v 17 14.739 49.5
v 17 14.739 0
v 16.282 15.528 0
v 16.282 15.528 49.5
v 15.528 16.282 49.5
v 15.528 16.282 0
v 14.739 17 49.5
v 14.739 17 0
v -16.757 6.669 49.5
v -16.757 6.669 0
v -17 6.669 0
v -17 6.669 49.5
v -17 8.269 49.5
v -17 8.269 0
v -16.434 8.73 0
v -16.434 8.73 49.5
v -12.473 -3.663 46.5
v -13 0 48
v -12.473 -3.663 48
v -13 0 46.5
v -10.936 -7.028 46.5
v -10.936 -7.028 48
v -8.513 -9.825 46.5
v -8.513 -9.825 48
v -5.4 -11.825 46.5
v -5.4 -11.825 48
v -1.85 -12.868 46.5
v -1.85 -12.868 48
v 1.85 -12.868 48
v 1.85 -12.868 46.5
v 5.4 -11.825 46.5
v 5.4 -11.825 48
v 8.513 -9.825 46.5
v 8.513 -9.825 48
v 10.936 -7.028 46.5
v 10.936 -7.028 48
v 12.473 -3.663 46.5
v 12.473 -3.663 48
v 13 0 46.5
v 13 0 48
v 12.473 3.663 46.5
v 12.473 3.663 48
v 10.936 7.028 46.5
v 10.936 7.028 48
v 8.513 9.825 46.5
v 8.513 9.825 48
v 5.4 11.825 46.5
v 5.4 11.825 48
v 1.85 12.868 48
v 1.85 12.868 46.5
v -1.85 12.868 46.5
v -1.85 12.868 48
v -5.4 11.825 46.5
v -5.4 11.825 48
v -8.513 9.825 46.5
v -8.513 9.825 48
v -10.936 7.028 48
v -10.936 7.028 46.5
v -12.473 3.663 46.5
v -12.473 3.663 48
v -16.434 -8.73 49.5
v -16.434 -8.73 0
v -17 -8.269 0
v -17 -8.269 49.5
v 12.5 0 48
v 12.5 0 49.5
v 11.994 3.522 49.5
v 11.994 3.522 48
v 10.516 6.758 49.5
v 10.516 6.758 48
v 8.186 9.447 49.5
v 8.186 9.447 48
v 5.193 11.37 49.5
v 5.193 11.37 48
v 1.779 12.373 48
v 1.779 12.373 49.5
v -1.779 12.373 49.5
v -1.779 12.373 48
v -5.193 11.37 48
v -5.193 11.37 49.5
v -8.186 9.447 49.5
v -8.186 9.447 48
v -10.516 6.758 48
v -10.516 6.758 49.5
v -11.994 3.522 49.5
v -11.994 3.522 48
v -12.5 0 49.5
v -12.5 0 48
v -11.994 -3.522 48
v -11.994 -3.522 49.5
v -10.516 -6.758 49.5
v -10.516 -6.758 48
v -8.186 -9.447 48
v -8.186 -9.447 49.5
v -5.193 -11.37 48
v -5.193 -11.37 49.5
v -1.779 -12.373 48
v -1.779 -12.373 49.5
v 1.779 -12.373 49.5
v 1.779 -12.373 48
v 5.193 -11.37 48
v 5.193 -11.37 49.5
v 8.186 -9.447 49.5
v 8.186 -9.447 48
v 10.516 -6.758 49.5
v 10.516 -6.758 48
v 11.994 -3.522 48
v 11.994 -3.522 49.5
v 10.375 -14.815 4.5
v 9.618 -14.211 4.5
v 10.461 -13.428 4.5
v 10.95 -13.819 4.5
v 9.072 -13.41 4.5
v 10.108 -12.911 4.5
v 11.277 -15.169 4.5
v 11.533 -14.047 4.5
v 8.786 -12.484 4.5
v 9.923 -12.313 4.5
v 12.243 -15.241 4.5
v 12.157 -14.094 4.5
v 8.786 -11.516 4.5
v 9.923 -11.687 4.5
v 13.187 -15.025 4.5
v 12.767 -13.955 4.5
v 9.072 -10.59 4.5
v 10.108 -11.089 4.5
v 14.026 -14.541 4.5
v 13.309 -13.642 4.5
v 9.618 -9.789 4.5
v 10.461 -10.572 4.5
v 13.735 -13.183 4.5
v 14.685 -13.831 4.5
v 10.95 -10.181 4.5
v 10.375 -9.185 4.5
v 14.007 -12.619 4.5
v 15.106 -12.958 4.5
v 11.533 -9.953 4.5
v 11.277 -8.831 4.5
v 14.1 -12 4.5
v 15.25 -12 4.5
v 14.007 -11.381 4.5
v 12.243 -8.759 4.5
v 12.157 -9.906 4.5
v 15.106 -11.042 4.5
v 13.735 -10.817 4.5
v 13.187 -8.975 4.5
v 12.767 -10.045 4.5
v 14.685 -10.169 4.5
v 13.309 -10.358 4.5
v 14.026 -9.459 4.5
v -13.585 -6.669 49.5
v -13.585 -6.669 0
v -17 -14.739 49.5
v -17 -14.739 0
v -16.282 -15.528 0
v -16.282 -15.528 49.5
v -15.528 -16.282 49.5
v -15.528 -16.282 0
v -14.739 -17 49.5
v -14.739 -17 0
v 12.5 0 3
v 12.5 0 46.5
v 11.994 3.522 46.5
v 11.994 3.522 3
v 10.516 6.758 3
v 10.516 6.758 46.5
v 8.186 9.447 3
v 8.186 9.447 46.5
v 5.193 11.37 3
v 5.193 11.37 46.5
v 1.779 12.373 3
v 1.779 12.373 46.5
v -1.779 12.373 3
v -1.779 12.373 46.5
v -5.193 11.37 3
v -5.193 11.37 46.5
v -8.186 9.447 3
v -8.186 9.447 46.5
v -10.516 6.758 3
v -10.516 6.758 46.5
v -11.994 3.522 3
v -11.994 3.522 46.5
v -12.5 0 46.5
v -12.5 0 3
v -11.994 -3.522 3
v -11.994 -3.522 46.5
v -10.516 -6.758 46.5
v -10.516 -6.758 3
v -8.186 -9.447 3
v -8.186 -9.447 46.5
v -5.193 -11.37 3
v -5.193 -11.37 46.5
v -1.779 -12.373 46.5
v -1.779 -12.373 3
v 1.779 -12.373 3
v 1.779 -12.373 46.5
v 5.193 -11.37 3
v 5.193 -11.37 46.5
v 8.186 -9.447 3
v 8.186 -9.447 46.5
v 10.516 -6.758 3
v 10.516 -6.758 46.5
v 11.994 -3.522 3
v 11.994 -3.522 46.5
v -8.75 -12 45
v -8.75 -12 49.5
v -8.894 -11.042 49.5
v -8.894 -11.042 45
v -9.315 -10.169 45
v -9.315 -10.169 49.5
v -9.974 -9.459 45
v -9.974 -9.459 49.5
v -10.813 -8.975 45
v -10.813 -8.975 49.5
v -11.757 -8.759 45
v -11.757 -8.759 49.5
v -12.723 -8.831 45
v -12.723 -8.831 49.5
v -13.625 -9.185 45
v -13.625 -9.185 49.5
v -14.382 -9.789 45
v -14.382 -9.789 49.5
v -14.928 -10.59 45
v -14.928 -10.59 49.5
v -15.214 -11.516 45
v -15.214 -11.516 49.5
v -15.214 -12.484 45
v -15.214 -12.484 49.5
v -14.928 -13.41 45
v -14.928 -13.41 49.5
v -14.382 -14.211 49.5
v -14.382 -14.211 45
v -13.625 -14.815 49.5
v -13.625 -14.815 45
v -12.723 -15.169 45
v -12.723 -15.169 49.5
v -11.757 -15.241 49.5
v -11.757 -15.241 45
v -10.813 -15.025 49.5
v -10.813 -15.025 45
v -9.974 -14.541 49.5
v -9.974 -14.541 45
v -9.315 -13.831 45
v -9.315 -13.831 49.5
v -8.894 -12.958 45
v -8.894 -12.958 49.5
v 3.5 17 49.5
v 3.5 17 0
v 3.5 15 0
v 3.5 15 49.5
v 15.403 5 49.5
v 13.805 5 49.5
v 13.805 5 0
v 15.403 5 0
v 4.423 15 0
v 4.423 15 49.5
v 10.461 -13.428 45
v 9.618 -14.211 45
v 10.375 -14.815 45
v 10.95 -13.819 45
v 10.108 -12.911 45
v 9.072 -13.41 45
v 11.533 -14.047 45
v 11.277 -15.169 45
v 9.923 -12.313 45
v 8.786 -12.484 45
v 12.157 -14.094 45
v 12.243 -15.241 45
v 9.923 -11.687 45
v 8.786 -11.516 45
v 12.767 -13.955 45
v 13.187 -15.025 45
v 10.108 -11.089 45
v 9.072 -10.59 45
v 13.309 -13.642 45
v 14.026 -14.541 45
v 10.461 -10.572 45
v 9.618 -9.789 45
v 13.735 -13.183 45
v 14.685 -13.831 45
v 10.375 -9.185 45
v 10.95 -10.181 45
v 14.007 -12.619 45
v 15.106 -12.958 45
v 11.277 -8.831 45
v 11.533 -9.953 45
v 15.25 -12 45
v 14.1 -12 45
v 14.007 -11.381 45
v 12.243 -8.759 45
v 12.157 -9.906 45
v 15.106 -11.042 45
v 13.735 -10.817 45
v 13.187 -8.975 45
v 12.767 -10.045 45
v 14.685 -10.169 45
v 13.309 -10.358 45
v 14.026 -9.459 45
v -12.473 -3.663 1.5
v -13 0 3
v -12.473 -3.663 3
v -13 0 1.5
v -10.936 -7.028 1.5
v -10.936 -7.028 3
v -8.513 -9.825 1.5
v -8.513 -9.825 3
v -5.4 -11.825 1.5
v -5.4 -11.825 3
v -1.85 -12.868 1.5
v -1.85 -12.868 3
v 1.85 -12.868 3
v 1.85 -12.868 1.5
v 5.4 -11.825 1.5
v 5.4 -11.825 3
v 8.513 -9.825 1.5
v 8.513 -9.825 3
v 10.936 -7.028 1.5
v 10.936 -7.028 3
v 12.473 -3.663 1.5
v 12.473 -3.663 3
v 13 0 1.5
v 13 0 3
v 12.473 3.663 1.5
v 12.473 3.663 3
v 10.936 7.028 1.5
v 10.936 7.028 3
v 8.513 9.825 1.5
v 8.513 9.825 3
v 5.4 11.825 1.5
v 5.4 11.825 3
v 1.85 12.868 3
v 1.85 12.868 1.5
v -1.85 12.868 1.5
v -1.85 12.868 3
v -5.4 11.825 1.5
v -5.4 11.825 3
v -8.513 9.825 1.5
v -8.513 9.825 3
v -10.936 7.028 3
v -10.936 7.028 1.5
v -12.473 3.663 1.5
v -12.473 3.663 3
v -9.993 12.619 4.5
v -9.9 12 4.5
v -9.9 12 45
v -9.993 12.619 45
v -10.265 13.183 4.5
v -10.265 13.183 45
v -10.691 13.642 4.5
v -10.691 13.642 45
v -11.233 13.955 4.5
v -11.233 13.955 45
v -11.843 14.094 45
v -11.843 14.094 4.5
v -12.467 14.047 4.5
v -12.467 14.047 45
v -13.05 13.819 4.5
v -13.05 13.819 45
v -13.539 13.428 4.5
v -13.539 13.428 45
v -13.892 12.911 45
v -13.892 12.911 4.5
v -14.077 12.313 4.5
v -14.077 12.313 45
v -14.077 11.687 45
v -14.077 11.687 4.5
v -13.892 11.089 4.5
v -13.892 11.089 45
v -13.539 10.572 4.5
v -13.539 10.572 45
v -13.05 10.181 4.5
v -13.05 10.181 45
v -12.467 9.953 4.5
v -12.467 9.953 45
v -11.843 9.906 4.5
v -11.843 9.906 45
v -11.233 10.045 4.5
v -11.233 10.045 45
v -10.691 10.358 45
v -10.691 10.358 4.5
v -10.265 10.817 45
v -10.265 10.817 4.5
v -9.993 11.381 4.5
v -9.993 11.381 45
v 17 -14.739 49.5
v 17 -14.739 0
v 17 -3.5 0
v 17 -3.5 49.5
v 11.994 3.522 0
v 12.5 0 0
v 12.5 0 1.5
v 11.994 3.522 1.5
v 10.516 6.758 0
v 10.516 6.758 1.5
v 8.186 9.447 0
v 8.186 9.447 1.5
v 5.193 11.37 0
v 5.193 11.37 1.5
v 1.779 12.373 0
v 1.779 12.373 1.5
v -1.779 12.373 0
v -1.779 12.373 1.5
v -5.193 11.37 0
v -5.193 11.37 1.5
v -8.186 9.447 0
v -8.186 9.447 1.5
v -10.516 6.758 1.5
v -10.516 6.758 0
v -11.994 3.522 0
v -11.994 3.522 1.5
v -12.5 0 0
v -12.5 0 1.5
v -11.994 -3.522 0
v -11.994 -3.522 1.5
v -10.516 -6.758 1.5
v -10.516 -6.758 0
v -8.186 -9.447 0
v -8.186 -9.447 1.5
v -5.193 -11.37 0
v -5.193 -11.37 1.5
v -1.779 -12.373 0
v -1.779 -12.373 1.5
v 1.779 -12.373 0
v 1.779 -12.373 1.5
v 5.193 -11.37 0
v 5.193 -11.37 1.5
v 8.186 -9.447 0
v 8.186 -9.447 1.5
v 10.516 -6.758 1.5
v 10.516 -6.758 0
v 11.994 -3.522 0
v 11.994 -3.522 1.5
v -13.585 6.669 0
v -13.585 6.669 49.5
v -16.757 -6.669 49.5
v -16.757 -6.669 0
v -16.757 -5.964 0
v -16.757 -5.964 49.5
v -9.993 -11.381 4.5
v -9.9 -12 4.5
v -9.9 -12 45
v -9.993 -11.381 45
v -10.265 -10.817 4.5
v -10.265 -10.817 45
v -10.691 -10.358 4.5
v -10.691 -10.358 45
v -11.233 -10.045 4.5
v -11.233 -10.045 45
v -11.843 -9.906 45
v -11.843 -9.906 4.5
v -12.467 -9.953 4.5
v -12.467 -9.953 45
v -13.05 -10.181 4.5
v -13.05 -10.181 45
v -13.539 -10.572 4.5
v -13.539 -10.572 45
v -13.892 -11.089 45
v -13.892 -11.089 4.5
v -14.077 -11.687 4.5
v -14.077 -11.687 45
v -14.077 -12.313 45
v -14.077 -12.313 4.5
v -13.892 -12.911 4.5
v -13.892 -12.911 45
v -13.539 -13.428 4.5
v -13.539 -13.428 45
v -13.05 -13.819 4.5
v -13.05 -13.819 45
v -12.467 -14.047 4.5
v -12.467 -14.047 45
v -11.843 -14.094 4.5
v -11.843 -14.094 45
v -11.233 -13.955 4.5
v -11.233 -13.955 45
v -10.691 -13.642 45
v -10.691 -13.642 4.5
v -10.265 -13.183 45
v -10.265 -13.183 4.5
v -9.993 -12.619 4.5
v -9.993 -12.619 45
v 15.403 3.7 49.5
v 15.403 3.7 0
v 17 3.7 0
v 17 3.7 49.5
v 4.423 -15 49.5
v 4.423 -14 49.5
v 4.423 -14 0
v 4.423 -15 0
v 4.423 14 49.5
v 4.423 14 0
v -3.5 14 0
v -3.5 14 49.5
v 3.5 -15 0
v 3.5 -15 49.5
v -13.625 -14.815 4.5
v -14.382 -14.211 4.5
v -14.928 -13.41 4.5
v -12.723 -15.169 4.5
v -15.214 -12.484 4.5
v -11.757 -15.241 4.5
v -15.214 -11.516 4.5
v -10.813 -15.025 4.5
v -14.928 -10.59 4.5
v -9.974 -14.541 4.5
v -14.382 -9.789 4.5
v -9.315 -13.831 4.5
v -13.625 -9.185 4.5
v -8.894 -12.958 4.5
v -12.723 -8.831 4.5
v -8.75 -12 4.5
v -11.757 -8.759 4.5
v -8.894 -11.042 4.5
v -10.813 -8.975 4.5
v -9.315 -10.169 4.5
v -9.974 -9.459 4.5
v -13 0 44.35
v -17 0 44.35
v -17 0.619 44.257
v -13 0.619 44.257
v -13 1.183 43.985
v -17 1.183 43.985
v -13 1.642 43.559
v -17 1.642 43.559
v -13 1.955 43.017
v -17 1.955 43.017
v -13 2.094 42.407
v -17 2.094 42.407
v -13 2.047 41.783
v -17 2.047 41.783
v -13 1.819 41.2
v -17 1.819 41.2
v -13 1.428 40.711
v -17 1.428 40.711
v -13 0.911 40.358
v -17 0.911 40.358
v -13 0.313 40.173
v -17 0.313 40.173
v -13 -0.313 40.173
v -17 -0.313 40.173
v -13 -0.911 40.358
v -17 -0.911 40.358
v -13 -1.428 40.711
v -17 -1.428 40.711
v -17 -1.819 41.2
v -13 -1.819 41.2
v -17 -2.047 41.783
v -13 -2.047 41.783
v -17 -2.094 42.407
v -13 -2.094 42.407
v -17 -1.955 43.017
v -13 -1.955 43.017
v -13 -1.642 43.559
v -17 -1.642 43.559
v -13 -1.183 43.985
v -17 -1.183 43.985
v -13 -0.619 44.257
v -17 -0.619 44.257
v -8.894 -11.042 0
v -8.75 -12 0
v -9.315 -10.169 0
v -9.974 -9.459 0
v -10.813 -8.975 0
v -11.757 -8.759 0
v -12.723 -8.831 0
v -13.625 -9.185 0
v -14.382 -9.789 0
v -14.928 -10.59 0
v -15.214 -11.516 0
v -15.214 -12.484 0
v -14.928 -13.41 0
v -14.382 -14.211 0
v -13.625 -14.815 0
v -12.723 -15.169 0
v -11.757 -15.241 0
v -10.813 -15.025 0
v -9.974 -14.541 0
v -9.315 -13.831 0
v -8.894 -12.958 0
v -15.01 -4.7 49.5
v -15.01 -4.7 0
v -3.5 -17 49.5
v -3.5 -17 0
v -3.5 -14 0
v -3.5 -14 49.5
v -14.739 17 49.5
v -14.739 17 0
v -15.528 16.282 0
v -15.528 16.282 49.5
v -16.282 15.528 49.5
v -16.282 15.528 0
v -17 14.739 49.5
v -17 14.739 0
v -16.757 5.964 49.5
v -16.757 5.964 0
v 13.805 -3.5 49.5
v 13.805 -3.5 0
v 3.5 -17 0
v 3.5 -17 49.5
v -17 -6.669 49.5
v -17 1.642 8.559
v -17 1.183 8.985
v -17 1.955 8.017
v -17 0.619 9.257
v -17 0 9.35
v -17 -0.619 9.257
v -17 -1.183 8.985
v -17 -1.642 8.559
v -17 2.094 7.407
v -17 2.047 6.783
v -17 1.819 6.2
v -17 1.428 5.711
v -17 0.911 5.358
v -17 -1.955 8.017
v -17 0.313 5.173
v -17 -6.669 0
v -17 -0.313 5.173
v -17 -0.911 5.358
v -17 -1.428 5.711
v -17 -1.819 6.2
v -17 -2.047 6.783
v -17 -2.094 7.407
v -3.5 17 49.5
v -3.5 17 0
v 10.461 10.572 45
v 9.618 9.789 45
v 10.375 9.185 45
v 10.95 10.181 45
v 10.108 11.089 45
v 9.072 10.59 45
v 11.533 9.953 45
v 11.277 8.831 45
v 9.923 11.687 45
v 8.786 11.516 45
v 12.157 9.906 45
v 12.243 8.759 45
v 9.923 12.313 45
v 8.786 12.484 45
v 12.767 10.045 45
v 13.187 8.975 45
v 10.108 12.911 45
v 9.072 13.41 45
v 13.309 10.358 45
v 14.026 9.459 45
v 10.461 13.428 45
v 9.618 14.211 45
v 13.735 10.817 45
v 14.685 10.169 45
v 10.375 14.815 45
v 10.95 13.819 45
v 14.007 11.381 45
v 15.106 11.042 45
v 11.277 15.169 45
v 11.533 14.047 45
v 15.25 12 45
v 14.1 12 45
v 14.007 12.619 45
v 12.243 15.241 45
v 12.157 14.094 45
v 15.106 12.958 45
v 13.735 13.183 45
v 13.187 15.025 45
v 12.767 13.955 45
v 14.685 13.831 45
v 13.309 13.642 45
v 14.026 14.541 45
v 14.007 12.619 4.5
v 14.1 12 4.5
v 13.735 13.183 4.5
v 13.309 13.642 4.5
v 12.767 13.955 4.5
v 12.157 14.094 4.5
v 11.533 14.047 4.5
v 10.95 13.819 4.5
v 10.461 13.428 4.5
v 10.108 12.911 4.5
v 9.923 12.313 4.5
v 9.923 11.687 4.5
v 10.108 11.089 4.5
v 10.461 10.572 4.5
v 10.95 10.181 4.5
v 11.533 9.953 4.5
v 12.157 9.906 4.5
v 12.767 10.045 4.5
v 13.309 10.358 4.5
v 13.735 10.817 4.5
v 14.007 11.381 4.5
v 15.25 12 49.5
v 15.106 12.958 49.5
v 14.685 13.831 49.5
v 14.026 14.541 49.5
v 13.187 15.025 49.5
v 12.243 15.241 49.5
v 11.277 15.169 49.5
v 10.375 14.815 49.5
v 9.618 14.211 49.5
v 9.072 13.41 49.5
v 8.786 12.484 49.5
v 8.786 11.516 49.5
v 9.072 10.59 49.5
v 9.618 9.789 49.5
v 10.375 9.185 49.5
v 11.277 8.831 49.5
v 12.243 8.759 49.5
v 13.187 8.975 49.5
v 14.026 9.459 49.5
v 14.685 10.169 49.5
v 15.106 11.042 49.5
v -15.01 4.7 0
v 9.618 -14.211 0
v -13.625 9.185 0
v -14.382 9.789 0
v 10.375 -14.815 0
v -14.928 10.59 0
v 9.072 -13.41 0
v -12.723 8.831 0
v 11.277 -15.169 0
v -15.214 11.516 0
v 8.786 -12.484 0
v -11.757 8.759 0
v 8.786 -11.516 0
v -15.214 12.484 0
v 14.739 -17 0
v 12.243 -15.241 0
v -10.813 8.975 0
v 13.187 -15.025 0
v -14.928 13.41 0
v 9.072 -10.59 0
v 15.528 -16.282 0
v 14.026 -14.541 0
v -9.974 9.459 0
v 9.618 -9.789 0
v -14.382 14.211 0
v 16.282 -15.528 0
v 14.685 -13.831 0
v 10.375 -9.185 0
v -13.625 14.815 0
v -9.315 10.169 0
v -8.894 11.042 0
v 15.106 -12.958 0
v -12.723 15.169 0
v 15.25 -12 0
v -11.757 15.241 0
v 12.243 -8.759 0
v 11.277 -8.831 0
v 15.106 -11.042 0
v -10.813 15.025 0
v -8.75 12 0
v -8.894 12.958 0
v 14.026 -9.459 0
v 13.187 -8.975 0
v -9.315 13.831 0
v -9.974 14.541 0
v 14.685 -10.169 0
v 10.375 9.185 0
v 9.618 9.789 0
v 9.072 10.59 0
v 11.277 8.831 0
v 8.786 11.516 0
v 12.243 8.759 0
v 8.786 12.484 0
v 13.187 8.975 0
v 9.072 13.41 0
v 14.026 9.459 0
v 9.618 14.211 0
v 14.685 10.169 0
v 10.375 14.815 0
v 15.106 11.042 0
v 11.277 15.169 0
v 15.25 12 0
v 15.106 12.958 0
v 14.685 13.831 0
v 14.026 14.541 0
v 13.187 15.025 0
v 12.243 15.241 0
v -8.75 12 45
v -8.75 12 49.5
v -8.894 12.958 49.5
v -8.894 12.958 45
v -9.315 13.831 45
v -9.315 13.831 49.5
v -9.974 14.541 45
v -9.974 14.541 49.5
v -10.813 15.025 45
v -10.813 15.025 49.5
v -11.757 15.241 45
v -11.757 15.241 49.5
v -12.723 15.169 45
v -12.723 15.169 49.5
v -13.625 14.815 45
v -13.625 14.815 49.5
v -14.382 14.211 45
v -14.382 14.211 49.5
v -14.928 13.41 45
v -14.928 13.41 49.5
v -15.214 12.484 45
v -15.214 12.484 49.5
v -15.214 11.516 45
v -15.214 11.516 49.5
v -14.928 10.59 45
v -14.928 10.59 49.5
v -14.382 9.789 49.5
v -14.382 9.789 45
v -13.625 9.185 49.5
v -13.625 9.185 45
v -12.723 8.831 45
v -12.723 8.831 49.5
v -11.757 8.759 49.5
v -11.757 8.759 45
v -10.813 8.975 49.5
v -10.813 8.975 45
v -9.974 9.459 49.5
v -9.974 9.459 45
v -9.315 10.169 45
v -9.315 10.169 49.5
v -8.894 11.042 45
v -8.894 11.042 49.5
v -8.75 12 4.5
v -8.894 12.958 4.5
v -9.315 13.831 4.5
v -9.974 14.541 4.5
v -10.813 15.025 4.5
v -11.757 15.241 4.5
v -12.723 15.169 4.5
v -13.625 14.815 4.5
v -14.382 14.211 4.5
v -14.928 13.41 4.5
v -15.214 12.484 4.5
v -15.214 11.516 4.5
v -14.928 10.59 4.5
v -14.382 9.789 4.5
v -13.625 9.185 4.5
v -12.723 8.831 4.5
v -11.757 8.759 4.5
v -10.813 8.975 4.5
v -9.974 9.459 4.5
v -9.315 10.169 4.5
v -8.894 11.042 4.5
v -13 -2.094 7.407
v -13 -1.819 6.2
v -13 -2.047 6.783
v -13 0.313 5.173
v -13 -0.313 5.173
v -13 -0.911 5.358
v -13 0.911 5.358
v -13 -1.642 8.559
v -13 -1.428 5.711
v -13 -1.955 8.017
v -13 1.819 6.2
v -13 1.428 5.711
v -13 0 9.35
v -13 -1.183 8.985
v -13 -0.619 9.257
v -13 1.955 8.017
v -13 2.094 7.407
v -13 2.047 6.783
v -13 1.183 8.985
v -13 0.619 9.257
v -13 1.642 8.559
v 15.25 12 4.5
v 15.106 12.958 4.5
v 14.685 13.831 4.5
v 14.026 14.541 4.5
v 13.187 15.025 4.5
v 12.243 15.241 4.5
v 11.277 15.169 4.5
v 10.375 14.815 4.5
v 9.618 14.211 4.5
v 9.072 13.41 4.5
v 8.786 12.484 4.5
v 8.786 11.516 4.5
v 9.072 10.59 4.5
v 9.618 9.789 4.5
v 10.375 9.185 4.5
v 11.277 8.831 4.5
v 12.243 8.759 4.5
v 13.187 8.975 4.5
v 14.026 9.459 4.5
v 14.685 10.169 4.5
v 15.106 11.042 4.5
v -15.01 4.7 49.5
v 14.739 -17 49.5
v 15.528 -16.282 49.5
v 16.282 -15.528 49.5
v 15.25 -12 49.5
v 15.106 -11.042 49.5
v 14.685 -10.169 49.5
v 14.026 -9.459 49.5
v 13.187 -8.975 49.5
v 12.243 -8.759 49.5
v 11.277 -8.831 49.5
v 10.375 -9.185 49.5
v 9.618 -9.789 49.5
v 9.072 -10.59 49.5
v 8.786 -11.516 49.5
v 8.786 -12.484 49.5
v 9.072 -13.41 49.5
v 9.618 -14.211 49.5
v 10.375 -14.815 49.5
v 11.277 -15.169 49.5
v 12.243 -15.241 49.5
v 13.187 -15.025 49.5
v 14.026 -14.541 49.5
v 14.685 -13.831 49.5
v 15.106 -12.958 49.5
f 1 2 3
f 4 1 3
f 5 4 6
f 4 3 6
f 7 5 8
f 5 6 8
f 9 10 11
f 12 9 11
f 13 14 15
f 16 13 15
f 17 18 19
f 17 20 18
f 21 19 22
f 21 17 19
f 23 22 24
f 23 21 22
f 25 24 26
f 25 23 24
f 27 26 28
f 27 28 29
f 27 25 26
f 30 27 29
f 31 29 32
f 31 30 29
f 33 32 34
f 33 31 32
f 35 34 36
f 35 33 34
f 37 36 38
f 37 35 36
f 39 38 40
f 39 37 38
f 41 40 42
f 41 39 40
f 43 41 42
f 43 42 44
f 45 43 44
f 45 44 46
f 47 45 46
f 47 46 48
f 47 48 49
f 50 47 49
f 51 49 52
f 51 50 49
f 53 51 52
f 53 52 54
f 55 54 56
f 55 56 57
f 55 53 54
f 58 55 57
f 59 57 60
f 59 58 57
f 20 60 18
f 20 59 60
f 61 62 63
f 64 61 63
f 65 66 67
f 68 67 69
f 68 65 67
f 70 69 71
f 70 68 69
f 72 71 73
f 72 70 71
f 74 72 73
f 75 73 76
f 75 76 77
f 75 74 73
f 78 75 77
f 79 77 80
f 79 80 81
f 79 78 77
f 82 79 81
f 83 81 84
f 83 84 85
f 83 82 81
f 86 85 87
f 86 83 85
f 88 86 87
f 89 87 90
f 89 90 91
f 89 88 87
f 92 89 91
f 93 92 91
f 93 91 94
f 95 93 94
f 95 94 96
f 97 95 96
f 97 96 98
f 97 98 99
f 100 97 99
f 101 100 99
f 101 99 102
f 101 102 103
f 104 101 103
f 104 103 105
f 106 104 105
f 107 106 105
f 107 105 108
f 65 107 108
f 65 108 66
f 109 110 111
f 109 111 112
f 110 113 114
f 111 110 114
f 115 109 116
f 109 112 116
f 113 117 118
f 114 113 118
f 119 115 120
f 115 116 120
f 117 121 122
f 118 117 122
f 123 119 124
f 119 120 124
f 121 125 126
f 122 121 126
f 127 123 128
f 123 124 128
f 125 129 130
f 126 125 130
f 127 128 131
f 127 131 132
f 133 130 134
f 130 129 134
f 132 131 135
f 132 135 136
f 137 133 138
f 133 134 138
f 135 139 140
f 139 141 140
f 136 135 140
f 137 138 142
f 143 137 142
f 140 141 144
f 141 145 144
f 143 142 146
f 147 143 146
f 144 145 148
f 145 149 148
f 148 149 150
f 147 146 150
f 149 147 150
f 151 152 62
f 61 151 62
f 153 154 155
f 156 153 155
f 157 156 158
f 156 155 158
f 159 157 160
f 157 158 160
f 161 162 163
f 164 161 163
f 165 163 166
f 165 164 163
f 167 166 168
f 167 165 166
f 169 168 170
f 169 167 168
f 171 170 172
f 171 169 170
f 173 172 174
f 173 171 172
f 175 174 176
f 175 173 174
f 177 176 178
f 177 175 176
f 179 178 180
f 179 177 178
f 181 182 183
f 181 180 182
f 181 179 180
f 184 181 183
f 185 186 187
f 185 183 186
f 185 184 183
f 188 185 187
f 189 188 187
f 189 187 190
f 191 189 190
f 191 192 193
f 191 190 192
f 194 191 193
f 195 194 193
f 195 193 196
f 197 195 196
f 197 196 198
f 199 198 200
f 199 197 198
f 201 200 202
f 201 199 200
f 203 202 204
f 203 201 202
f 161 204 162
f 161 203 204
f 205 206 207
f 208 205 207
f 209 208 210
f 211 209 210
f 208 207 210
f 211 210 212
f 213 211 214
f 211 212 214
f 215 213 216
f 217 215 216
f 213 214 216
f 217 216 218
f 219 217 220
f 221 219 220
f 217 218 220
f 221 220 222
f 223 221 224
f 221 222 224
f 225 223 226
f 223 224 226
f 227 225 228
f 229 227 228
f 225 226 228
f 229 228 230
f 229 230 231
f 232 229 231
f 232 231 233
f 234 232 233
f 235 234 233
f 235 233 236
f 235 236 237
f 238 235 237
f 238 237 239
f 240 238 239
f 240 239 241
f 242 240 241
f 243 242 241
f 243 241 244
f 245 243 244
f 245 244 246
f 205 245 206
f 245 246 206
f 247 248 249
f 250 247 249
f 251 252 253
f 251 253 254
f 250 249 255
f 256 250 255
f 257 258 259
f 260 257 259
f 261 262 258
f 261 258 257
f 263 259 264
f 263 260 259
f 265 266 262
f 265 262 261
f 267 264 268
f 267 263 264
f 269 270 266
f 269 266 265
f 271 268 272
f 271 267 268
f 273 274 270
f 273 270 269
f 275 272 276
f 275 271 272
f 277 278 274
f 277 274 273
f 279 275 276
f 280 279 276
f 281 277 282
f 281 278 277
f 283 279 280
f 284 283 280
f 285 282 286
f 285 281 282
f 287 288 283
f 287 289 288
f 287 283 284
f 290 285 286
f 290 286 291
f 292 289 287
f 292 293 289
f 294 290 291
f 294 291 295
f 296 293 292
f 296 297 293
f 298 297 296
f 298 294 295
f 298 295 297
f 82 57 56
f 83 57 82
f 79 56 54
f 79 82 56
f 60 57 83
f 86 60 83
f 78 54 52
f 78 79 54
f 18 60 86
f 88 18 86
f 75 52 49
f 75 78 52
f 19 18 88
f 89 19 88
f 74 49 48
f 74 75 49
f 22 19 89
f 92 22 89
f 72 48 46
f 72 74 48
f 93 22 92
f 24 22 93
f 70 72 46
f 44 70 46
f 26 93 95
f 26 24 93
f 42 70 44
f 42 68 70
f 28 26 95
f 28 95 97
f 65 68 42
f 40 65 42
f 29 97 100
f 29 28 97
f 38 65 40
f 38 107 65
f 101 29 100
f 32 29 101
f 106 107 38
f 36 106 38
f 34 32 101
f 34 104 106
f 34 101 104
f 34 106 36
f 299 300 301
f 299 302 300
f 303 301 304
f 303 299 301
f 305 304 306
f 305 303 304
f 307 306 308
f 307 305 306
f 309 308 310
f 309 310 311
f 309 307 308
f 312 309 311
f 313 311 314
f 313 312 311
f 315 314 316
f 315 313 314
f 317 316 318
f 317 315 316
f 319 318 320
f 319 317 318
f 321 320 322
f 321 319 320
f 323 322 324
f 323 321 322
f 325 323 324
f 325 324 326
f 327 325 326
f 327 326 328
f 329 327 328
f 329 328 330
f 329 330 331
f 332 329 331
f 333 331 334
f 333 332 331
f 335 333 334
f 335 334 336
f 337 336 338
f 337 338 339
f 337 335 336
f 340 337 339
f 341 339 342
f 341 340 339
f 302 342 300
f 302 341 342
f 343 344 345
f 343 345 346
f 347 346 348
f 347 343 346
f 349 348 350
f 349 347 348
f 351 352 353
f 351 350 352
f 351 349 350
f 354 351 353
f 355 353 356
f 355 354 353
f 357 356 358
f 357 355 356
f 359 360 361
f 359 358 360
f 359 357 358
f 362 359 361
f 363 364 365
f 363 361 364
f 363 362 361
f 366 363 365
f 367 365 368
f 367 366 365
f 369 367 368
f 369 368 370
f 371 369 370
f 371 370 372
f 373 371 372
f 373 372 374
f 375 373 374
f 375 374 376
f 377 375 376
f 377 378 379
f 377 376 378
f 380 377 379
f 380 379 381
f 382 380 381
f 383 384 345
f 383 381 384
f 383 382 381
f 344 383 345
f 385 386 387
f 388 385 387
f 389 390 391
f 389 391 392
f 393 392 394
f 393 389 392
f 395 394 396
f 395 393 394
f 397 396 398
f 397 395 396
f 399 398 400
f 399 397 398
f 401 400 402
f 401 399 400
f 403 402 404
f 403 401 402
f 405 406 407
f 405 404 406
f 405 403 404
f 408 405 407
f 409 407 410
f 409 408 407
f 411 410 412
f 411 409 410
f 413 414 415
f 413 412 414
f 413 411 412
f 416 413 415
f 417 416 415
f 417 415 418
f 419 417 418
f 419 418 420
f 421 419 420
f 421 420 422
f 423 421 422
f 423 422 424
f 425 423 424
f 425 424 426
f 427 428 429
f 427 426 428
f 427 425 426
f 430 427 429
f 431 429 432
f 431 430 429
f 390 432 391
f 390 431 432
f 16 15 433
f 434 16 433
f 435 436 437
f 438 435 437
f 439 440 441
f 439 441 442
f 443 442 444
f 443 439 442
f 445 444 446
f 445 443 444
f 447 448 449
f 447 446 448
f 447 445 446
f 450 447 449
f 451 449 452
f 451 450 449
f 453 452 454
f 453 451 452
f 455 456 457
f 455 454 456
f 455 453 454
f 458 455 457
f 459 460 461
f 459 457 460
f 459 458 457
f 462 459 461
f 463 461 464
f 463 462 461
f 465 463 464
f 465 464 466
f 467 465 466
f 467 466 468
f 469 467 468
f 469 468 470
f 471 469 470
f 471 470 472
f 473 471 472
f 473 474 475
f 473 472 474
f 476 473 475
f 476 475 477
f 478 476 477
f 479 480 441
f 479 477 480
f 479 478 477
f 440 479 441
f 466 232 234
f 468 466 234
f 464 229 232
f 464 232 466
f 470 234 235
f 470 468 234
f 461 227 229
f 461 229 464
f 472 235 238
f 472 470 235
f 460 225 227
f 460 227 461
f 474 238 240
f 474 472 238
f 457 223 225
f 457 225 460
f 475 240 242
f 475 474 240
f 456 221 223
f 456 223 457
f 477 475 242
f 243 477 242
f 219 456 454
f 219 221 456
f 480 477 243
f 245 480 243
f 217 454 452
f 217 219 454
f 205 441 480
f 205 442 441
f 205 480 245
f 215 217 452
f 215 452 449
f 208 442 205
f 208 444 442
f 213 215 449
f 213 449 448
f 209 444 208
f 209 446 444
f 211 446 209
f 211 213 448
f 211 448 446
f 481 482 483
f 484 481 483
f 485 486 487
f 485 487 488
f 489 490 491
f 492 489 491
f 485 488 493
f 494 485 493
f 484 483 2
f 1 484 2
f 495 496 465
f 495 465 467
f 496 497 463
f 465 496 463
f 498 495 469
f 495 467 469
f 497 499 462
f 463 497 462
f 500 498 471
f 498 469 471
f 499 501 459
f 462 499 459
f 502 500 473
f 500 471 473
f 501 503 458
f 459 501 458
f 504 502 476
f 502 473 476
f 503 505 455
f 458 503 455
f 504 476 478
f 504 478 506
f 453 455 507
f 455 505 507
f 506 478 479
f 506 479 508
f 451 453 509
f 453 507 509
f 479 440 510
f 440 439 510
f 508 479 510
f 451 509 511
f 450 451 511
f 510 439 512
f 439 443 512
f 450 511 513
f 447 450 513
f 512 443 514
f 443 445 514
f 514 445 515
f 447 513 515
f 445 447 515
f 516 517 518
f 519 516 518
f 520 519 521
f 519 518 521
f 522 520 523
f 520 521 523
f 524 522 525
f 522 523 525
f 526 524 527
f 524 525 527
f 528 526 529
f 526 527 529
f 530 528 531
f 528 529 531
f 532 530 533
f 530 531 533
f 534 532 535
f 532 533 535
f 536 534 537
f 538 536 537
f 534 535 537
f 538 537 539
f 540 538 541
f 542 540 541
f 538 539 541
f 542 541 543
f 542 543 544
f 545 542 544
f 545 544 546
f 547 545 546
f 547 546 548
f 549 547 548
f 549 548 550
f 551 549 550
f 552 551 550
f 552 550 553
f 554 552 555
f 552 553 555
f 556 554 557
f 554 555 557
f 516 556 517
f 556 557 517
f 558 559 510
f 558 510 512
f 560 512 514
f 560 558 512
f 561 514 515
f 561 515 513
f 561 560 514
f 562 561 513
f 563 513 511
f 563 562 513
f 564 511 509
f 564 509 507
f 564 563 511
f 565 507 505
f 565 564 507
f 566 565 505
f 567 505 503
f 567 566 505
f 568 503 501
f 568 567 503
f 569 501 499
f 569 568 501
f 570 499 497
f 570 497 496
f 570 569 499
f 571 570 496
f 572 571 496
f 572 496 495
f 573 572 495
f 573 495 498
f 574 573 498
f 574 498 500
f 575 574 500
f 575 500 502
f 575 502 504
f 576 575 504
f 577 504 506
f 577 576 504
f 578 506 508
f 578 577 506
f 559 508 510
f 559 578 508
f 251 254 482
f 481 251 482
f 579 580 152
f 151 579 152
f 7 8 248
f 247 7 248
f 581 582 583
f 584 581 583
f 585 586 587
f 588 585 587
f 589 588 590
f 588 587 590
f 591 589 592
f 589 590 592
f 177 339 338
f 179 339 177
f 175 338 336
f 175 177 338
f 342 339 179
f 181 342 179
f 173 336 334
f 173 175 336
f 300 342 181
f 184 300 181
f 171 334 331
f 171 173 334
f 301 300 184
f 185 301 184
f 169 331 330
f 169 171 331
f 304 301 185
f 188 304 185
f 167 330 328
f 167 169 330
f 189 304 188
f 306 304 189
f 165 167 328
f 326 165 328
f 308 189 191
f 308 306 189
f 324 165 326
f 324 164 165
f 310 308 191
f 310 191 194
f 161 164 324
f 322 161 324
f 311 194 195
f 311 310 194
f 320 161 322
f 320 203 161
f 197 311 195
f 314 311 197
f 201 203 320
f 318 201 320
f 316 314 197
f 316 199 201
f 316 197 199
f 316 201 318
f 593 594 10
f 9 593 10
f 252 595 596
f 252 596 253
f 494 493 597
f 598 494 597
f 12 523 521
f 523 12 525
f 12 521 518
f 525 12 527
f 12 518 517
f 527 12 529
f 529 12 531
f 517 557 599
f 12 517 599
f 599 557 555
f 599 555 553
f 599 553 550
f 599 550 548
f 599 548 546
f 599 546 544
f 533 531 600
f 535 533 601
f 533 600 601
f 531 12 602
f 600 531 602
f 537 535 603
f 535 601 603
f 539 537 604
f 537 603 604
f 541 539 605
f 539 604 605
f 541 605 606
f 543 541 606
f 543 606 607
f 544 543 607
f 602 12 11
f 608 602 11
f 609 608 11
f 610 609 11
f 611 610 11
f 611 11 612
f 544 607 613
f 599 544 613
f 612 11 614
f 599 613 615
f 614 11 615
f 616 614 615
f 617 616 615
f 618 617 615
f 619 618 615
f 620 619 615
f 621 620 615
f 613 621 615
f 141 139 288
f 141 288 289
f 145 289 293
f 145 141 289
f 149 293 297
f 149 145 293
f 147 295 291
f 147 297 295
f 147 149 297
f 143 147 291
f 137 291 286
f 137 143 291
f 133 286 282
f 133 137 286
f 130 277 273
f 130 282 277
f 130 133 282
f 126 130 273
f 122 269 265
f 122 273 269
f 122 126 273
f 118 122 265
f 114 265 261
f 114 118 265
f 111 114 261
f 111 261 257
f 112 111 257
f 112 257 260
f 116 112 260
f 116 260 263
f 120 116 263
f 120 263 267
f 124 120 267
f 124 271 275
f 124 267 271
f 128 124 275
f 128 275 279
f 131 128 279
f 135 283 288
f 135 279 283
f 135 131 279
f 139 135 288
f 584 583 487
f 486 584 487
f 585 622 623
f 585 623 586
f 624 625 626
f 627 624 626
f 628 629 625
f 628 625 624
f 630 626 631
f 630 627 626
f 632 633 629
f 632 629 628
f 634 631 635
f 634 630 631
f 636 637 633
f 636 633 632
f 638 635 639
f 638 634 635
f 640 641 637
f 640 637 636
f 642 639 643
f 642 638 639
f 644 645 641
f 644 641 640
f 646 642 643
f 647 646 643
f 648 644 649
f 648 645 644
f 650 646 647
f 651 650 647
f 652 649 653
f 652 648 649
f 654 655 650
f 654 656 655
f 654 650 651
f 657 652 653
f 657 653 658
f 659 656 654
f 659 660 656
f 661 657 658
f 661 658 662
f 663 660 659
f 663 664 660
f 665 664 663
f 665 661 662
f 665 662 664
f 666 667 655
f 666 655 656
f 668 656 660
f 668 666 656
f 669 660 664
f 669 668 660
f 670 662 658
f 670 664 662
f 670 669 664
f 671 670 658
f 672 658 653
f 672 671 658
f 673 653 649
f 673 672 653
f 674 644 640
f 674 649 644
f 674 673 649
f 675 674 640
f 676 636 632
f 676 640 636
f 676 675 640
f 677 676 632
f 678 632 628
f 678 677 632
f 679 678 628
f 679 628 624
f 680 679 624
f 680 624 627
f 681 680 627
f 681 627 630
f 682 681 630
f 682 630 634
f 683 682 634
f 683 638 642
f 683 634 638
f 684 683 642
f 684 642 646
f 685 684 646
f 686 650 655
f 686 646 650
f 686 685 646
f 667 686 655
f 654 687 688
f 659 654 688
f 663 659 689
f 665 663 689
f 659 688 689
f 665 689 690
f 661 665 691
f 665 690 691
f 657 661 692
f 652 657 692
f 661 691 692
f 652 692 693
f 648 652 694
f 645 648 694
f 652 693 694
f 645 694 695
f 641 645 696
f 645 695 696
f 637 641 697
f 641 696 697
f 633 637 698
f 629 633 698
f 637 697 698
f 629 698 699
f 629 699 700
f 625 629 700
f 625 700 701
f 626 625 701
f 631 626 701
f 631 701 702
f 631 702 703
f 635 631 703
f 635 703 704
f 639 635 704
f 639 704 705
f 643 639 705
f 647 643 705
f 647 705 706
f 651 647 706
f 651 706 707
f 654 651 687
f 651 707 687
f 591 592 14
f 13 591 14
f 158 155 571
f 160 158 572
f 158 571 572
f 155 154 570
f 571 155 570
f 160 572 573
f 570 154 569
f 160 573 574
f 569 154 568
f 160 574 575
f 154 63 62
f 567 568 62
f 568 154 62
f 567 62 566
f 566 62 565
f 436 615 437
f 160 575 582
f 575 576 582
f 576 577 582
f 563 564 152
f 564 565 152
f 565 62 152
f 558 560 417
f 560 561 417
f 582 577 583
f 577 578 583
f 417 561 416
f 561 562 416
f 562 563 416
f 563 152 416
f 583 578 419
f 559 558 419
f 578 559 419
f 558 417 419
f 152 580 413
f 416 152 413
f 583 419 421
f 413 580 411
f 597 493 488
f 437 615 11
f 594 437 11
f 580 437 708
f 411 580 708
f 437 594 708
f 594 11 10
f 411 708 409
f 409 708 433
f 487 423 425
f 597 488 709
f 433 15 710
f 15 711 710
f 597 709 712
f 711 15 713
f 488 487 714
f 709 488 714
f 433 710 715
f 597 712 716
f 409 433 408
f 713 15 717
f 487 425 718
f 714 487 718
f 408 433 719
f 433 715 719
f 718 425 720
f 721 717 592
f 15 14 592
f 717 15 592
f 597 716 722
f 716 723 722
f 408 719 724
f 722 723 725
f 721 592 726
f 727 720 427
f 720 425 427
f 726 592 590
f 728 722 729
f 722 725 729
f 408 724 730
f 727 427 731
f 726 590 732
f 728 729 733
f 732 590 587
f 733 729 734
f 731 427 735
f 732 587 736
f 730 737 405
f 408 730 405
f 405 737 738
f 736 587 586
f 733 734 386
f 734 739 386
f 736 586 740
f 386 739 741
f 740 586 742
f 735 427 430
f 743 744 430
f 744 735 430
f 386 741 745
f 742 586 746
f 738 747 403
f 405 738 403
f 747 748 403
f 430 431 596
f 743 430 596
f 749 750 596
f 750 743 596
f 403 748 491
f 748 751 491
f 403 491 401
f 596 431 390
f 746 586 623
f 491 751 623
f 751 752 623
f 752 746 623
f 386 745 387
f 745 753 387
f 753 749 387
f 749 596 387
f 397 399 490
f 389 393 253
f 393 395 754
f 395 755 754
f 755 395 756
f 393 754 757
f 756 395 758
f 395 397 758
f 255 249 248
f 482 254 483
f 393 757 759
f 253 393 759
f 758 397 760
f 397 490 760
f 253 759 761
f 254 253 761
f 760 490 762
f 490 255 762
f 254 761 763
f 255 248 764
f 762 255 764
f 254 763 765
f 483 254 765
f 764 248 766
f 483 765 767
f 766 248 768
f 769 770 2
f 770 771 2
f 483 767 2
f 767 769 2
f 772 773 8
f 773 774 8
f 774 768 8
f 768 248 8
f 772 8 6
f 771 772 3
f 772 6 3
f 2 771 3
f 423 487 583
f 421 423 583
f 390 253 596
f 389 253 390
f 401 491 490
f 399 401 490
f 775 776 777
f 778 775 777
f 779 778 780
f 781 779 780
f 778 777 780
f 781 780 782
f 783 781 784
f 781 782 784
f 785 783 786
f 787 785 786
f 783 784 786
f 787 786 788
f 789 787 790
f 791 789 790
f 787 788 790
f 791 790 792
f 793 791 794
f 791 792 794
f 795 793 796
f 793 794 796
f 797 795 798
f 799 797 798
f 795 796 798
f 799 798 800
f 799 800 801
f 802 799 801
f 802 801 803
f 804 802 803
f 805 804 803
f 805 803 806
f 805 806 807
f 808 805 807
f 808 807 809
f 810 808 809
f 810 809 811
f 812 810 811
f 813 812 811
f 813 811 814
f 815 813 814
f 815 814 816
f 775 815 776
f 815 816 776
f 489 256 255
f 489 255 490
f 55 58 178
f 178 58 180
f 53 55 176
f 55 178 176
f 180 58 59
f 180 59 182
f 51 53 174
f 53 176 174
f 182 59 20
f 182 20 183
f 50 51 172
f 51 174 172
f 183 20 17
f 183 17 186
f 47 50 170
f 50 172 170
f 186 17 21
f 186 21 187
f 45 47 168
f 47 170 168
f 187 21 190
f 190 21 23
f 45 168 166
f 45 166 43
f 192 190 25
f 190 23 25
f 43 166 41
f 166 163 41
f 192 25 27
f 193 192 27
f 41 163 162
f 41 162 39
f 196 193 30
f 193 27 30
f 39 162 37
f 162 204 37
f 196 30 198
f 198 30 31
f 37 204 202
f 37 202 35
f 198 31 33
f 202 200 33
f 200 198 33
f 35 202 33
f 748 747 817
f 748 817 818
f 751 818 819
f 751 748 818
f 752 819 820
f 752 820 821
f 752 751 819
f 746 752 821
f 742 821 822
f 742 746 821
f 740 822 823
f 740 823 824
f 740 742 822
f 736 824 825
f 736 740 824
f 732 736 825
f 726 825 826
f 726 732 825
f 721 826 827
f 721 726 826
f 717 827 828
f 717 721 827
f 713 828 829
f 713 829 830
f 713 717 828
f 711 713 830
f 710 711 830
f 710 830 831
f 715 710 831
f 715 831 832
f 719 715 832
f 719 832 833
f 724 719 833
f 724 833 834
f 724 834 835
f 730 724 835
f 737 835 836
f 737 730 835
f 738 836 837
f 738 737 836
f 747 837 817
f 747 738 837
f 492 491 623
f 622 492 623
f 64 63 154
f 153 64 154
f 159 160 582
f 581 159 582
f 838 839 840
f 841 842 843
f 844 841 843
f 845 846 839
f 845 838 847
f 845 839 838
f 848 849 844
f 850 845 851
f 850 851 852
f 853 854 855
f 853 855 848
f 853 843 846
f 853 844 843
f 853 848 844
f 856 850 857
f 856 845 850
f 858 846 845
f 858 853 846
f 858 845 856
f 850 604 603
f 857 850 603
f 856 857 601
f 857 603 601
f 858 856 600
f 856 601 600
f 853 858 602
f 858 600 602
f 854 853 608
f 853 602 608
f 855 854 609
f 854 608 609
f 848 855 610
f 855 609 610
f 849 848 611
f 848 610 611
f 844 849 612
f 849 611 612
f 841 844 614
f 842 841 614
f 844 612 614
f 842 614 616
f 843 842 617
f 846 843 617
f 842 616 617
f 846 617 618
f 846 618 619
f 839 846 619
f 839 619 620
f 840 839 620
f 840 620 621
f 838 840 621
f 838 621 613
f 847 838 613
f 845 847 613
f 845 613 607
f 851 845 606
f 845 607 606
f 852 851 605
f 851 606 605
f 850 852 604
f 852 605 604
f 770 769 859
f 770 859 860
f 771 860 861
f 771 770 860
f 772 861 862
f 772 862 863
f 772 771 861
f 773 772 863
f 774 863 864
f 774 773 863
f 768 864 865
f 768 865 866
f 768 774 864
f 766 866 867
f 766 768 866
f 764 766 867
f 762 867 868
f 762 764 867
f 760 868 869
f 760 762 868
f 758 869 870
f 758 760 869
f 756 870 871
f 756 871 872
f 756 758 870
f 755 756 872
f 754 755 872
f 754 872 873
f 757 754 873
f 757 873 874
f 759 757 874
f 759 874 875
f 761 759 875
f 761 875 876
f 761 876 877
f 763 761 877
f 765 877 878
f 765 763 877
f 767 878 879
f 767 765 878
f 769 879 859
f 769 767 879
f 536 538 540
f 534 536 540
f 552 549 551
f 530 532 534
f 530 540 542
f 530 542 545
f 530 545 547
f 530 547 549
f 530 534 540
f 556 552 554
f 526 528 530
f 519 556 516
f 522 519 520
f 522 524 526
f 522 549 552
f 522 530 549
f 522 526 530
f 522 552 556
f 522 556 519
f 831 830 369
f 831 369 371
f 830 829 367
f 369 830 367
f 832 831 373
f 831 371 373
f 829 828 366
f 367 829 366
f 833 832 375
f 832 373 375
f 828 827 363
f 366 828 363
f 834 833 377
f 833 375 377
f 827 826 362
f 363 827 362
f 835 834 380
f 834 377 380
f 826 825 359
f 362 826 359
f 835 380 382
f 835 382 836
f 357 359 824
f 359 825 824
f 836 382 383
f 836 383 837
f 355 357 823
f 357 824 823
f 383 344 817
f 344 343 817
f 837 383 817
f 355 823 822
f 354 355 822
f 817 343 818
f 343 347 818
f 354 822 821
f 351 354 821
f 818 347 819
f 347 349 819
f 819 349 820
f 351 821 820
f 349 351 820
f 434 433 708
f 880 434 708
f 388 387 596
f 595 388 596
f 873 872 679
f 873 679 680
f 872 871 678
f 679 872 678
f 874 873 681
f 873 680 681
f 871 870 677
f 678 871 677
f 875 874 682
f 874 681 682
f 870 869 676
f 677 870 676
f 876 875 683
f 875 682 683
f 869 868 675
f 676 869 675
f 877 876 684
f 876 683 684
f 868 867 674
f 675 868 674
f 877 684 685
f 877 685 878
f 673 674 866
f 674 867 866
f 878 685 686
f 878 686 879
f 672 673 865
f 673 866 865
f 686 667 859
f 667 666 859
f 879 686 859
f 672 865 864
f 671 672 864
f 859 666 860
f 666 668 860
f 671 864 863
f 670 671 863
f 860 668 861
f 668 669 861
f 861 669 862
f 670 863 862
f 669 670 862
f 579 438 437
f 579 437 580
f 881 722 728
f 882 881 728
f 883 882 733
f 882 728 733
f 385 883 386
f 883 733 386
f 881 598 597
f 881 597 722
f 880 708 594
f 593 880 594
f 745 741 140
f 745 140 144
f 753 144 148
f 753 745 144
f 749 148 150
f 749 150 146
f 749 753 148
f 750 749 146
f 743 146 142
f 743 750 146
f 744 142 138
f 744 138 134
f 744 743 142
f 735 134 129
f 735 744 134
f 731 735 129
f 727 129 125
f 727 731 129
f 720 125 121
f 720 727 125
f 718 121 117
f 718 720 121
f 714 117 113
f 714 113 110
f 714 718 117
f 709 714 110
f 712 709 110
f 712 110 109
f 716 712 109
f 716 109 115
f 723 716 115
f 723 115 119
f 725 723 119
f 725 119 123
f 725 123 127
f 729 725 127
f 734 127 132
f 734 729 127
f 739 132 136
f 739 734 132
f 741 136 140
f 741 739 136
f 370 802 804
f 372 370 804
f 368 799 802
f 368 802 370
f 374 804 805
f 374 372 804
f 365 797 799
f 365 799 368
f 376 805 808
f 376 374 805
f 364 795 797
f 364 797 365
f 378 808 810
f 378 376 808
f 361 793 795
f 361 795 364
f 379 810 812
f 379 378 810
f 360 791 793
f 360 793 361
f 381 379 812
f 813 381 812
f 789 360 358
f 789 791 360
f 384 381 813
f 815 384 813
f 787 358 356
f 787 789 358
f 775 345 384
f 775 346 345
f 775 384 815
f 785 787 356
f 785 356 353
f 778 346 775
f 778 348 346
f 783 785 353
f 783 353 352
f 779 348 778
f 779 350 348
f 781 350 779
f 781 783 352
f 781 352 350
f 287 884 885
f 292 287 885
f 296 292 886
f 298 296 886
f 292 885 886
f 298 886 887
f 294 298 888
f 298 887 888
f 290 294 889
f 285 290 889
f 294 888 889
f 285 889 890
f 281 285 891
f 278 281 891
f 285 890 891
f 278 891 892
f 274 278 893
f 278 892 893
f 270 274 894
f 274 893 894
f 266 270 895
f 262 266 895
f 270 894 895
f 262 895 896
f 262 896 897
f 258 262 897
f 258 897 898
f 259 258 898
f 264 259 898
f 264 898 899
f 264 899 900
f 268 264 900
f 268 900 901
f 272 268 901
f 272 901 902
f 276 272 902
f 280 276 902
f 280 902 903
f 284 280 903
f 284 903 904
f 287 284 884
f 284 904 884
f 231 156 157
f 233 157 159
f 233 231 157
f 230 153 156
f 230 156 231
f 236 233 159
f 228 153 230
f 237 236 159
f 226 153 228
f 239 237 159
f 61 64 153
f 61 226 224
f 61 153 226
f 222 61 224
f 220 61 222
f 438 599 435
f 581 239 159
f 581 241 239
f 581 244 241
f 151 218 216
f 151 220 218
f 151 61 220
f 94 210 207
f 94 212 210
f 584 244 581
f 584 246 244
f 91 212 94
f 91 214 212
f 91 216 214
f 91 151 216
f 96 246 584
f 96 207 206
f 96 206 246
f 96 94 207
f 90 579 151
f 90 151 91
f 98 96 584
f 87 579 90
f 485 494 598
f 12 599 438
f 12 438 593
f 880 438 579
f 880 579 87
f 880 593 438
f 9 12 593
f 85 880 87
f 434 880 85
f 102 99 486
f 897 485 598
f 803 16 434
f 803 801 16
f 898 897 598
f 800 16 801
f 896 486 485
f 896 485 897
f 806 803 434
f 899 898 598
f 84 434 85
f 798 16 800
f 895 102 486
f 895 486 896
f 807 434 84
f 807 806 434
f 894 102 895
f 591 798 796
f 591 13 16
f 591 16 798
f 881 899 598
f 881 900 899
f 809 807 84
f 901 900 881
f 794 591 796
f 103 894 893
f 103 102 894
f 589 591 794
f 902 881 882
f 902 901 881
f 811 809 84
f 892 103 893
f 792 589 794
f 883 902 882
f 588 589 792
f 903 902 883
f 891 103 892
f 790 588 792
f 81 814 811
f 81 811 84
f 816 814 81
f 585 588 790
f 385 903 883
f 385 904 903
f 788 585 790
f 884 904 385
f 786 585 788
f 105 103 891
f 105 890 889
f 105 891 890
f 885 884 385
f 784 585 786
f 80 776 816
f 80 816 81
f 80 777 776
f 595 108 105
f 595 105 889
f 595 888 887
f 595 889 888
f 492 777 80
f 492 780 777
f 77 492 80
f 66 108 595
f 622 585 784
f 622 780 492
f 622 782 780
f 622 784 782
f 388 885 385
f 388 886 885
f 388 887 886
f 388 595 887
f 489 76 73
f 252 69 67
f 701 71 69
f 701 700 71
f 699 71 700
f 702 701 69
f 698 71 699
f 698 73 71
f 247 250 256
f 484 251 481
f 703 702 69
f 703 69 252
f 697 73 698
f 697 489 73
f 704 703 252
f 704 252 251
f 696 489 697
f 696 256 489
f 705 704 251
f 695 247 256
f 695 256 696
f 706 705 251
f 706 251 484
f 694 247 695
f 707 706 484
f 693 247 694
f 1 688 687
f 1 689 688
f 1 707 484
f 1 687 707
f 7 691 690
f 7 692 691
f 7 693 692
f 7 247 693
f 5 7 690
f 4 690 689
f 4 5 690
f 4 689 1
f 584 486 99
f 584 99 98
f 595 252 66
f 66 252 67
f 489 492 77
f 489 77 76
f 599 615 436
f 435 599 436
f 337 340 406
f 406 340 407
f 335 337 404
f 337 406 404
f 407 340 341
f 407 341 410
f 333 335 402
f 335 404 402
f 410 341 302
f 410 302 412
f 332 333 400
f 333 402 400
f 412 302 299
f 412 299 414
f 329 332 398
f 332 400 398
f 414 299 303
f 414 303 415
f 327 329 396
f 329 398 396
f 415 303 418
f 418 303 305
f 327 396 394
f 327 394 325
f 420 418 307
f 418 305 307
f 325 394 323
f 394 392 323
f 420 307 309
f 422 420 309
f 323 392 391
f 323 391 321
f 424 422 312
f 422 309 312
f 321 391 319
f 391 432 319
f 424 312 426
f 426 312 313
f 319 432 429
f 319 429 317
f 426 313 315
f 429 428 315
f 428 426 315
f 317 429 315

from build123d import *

# Parameters (mm, degrees)
SKETCH_1_R          = 12.5
SKETCH_1_R_2        = 2.1
EXTRUDE_1_DEPTH     = 49.5
SKETCH_2_R          = 3.25
CUT_EXTRUDE_2_DEPTH = 4.5
SKETCH_4_W          = 13
SKETCH_4_H          = 1.5
SKETCH_5_R          = 2.1
CUT_EXTRUDE_3_DEPTH = 4


with BuildPart() as part:
    # 草图1 → 拉伸1 (new body)
    with BuildSketch(Plane.XY):
        with BuildLine():
            Line((-17, 8.268803112), (-16.434277079, 8.730182715))
            Line((-16.434277079, 8.730182715), (-13.585223978, 6.669165578))
            Line((-13.585223978, 6.669165578), (-15.009750528, 4.699967111))
            Line((-15.009750528, 4.699967111), (-16.756503192, 5.963575421))
            Line((-16.756503192, 5.963575421), (-16.756503192, 6.669165578))
            Line((-16.756503192, 6.669165578), (-17, 6.669165578))
            Line((-17, 6.669165578), (-17, -6.669165578))
            Line((-17, -6.669165578), (-16.756503192, -6.669165578))
            Line((-16.756503192, -6.669165578), (-16.756503192, -5.963575421))
            Line((-16.756503192, -5.963575421), (-15.009750528, -4.699967111))
            Line((-15.009750528, -4.699967111), (-13.585223978, -6.669165578))
            Line((-13.585223978, -6.669165578), (-16.434277079, -8.730182715))
            Line((-16.434277079, -8.730182715), (-17, -8.268803112))
            Line((-17, -8.268803112), (-17, -14.739402973))
            ThreePointArc((-17, -14.739402973), (-15.909902577, -15.909902577), (-14.739402973, -17))
            Line((-14.739402973, -17), (-3.5, -17))
            Line((-3.5, -17), (-3.5, -14))
            Line((-3.5, -14), (4.42289808, -14))
            Line((4.42289808, -14), (4.42289808, -15))
            Line((4.42289808, -15), (3.5, -15))
            Line((3.5, -15), (3.5, -17))
            Line((3.5, -17), (14.739402973, -17))
            ThreePointArc((14.739402973, -17), (15.909902577, -15.909902577), (17, -14.739402973))
            Line((17, -14.739402973), (17, -3.5))
            Line((17, -3.5), (13.805038875, -3.5))
            Line((13.805038875, -3.5), (13.805038875, 5))
            Line((13.805038875, 5), (15.402519437, 5))
            Line((15.402519437, 5), (15.402519437, 3.7))
            Line((15.402519437, 3.7), (17, 3.7))
            Line((17, 3.7), (17, 14.739402973))
            ThreePointArc((17, 14.739402973), (15.909902577, 15.909902577), (14.739402973, 17))
            Line((14.739402973, 17), (3.5, 17))
            Line((3.5, 17), (3.5, 15))
            Line((3.5, 15), (4.42289808, 15))
            Line((4.42289808, 15), (4.42289808, 14))
            Line((4.42289808, 14), (-3.5, 14))
            Line((-3.5, 14), (-3.5, 17))
            Line((-3.5, 17), (-14.739402973, 17))
            ThreePointArc((-14.739402973, 17), (-15.909902577, 15.909902577), (-17, 14.739402973))
            Line((-17, 14.739402973), (-17, 8.268803112))
        make_face()
        Circle(SKETCH_1_R, mode=Mode.SUBTRACT)
        with Locations((12, 12)):
            Circle(SKETCH_1_R_2, mode=Mode.SUBTRACT)
        with Locations((-12, 12)):
            Circle(SKETCH_1_R_2, mode=Mode.SUBTRACT)
        with Locations((-12, -12)):
            Circle(SKETCH_1_R_2, mode=Mode.SUBTRACT)
        with Locations((12, -12)):
            Circle(SKETCH_1_R_2, mode=Mode.SUBTRACT)
    extrude(amount=EXTRUDE_1_DEPTH)

    # 草图2 → 拉伸2 (cut)
    with BuildSketch(Plane.XY.offset(49.5)):
        with Locations((-12, 12)):
            Circle(SKETCH_2_R)
        with Locations((12, 12)):
            Circle(SKETCH_2_R)
        with Locations((12, -12)):
            Circle(SKETCH_2_R)
        with Locations((-12, -12)):
            Circle(SKETCH_2_R)
    cut_extrude_2 = extrude(amount=-CUT_EXTRUDE_2_DEPTH, mode=Mode.SUBTRACT)

    # 草图4 → 切除-旋转1 (revolve, cut)
    with BuildSketch(Plane(origin=(0, 0, 0), x_dir=(1, 0, 0), z_dir=(0, 1, 0)), mode=Mode.PRIVATE) as cut_revolve_1_sk:
        with Locations((6.5, -2.25)):
            Rectangle(SKETCH_4_W, SKETCH_4_H)
        with Locations((6.5, -47.25)):
            Rectangle(SKETCH_4_W, SKETCH_4_H)
    revolve(cut_revolve_1_sk.sketch.rotate(Axis((0, 0, 0), (0, 0, 1)), 180), axis=Axis((0, 0, 0), (0, 0, 1)), mode=Mode.SUBTRACT)

    # 镜向1: 拉伸2 across plane
    add(cut_extrude_2.mirror(Plane.XY.offset(24.75)), mode=Mode.SUBTRACT)

    # 草图5 → 拉伸3 (cut)
    with BuildSketch(Plane.ZY.offset(17)):
        with Locations((7.25, 0)):
            Circle(SKETCH_5_R)
        with Locations((42.25, 0)):
            Circle(SKETCH_5_R)
    extrude(amount=-CUT_EXTRUDE_3_DEPTH, mode=Mode.SUBTRACT)


solid = part.part
